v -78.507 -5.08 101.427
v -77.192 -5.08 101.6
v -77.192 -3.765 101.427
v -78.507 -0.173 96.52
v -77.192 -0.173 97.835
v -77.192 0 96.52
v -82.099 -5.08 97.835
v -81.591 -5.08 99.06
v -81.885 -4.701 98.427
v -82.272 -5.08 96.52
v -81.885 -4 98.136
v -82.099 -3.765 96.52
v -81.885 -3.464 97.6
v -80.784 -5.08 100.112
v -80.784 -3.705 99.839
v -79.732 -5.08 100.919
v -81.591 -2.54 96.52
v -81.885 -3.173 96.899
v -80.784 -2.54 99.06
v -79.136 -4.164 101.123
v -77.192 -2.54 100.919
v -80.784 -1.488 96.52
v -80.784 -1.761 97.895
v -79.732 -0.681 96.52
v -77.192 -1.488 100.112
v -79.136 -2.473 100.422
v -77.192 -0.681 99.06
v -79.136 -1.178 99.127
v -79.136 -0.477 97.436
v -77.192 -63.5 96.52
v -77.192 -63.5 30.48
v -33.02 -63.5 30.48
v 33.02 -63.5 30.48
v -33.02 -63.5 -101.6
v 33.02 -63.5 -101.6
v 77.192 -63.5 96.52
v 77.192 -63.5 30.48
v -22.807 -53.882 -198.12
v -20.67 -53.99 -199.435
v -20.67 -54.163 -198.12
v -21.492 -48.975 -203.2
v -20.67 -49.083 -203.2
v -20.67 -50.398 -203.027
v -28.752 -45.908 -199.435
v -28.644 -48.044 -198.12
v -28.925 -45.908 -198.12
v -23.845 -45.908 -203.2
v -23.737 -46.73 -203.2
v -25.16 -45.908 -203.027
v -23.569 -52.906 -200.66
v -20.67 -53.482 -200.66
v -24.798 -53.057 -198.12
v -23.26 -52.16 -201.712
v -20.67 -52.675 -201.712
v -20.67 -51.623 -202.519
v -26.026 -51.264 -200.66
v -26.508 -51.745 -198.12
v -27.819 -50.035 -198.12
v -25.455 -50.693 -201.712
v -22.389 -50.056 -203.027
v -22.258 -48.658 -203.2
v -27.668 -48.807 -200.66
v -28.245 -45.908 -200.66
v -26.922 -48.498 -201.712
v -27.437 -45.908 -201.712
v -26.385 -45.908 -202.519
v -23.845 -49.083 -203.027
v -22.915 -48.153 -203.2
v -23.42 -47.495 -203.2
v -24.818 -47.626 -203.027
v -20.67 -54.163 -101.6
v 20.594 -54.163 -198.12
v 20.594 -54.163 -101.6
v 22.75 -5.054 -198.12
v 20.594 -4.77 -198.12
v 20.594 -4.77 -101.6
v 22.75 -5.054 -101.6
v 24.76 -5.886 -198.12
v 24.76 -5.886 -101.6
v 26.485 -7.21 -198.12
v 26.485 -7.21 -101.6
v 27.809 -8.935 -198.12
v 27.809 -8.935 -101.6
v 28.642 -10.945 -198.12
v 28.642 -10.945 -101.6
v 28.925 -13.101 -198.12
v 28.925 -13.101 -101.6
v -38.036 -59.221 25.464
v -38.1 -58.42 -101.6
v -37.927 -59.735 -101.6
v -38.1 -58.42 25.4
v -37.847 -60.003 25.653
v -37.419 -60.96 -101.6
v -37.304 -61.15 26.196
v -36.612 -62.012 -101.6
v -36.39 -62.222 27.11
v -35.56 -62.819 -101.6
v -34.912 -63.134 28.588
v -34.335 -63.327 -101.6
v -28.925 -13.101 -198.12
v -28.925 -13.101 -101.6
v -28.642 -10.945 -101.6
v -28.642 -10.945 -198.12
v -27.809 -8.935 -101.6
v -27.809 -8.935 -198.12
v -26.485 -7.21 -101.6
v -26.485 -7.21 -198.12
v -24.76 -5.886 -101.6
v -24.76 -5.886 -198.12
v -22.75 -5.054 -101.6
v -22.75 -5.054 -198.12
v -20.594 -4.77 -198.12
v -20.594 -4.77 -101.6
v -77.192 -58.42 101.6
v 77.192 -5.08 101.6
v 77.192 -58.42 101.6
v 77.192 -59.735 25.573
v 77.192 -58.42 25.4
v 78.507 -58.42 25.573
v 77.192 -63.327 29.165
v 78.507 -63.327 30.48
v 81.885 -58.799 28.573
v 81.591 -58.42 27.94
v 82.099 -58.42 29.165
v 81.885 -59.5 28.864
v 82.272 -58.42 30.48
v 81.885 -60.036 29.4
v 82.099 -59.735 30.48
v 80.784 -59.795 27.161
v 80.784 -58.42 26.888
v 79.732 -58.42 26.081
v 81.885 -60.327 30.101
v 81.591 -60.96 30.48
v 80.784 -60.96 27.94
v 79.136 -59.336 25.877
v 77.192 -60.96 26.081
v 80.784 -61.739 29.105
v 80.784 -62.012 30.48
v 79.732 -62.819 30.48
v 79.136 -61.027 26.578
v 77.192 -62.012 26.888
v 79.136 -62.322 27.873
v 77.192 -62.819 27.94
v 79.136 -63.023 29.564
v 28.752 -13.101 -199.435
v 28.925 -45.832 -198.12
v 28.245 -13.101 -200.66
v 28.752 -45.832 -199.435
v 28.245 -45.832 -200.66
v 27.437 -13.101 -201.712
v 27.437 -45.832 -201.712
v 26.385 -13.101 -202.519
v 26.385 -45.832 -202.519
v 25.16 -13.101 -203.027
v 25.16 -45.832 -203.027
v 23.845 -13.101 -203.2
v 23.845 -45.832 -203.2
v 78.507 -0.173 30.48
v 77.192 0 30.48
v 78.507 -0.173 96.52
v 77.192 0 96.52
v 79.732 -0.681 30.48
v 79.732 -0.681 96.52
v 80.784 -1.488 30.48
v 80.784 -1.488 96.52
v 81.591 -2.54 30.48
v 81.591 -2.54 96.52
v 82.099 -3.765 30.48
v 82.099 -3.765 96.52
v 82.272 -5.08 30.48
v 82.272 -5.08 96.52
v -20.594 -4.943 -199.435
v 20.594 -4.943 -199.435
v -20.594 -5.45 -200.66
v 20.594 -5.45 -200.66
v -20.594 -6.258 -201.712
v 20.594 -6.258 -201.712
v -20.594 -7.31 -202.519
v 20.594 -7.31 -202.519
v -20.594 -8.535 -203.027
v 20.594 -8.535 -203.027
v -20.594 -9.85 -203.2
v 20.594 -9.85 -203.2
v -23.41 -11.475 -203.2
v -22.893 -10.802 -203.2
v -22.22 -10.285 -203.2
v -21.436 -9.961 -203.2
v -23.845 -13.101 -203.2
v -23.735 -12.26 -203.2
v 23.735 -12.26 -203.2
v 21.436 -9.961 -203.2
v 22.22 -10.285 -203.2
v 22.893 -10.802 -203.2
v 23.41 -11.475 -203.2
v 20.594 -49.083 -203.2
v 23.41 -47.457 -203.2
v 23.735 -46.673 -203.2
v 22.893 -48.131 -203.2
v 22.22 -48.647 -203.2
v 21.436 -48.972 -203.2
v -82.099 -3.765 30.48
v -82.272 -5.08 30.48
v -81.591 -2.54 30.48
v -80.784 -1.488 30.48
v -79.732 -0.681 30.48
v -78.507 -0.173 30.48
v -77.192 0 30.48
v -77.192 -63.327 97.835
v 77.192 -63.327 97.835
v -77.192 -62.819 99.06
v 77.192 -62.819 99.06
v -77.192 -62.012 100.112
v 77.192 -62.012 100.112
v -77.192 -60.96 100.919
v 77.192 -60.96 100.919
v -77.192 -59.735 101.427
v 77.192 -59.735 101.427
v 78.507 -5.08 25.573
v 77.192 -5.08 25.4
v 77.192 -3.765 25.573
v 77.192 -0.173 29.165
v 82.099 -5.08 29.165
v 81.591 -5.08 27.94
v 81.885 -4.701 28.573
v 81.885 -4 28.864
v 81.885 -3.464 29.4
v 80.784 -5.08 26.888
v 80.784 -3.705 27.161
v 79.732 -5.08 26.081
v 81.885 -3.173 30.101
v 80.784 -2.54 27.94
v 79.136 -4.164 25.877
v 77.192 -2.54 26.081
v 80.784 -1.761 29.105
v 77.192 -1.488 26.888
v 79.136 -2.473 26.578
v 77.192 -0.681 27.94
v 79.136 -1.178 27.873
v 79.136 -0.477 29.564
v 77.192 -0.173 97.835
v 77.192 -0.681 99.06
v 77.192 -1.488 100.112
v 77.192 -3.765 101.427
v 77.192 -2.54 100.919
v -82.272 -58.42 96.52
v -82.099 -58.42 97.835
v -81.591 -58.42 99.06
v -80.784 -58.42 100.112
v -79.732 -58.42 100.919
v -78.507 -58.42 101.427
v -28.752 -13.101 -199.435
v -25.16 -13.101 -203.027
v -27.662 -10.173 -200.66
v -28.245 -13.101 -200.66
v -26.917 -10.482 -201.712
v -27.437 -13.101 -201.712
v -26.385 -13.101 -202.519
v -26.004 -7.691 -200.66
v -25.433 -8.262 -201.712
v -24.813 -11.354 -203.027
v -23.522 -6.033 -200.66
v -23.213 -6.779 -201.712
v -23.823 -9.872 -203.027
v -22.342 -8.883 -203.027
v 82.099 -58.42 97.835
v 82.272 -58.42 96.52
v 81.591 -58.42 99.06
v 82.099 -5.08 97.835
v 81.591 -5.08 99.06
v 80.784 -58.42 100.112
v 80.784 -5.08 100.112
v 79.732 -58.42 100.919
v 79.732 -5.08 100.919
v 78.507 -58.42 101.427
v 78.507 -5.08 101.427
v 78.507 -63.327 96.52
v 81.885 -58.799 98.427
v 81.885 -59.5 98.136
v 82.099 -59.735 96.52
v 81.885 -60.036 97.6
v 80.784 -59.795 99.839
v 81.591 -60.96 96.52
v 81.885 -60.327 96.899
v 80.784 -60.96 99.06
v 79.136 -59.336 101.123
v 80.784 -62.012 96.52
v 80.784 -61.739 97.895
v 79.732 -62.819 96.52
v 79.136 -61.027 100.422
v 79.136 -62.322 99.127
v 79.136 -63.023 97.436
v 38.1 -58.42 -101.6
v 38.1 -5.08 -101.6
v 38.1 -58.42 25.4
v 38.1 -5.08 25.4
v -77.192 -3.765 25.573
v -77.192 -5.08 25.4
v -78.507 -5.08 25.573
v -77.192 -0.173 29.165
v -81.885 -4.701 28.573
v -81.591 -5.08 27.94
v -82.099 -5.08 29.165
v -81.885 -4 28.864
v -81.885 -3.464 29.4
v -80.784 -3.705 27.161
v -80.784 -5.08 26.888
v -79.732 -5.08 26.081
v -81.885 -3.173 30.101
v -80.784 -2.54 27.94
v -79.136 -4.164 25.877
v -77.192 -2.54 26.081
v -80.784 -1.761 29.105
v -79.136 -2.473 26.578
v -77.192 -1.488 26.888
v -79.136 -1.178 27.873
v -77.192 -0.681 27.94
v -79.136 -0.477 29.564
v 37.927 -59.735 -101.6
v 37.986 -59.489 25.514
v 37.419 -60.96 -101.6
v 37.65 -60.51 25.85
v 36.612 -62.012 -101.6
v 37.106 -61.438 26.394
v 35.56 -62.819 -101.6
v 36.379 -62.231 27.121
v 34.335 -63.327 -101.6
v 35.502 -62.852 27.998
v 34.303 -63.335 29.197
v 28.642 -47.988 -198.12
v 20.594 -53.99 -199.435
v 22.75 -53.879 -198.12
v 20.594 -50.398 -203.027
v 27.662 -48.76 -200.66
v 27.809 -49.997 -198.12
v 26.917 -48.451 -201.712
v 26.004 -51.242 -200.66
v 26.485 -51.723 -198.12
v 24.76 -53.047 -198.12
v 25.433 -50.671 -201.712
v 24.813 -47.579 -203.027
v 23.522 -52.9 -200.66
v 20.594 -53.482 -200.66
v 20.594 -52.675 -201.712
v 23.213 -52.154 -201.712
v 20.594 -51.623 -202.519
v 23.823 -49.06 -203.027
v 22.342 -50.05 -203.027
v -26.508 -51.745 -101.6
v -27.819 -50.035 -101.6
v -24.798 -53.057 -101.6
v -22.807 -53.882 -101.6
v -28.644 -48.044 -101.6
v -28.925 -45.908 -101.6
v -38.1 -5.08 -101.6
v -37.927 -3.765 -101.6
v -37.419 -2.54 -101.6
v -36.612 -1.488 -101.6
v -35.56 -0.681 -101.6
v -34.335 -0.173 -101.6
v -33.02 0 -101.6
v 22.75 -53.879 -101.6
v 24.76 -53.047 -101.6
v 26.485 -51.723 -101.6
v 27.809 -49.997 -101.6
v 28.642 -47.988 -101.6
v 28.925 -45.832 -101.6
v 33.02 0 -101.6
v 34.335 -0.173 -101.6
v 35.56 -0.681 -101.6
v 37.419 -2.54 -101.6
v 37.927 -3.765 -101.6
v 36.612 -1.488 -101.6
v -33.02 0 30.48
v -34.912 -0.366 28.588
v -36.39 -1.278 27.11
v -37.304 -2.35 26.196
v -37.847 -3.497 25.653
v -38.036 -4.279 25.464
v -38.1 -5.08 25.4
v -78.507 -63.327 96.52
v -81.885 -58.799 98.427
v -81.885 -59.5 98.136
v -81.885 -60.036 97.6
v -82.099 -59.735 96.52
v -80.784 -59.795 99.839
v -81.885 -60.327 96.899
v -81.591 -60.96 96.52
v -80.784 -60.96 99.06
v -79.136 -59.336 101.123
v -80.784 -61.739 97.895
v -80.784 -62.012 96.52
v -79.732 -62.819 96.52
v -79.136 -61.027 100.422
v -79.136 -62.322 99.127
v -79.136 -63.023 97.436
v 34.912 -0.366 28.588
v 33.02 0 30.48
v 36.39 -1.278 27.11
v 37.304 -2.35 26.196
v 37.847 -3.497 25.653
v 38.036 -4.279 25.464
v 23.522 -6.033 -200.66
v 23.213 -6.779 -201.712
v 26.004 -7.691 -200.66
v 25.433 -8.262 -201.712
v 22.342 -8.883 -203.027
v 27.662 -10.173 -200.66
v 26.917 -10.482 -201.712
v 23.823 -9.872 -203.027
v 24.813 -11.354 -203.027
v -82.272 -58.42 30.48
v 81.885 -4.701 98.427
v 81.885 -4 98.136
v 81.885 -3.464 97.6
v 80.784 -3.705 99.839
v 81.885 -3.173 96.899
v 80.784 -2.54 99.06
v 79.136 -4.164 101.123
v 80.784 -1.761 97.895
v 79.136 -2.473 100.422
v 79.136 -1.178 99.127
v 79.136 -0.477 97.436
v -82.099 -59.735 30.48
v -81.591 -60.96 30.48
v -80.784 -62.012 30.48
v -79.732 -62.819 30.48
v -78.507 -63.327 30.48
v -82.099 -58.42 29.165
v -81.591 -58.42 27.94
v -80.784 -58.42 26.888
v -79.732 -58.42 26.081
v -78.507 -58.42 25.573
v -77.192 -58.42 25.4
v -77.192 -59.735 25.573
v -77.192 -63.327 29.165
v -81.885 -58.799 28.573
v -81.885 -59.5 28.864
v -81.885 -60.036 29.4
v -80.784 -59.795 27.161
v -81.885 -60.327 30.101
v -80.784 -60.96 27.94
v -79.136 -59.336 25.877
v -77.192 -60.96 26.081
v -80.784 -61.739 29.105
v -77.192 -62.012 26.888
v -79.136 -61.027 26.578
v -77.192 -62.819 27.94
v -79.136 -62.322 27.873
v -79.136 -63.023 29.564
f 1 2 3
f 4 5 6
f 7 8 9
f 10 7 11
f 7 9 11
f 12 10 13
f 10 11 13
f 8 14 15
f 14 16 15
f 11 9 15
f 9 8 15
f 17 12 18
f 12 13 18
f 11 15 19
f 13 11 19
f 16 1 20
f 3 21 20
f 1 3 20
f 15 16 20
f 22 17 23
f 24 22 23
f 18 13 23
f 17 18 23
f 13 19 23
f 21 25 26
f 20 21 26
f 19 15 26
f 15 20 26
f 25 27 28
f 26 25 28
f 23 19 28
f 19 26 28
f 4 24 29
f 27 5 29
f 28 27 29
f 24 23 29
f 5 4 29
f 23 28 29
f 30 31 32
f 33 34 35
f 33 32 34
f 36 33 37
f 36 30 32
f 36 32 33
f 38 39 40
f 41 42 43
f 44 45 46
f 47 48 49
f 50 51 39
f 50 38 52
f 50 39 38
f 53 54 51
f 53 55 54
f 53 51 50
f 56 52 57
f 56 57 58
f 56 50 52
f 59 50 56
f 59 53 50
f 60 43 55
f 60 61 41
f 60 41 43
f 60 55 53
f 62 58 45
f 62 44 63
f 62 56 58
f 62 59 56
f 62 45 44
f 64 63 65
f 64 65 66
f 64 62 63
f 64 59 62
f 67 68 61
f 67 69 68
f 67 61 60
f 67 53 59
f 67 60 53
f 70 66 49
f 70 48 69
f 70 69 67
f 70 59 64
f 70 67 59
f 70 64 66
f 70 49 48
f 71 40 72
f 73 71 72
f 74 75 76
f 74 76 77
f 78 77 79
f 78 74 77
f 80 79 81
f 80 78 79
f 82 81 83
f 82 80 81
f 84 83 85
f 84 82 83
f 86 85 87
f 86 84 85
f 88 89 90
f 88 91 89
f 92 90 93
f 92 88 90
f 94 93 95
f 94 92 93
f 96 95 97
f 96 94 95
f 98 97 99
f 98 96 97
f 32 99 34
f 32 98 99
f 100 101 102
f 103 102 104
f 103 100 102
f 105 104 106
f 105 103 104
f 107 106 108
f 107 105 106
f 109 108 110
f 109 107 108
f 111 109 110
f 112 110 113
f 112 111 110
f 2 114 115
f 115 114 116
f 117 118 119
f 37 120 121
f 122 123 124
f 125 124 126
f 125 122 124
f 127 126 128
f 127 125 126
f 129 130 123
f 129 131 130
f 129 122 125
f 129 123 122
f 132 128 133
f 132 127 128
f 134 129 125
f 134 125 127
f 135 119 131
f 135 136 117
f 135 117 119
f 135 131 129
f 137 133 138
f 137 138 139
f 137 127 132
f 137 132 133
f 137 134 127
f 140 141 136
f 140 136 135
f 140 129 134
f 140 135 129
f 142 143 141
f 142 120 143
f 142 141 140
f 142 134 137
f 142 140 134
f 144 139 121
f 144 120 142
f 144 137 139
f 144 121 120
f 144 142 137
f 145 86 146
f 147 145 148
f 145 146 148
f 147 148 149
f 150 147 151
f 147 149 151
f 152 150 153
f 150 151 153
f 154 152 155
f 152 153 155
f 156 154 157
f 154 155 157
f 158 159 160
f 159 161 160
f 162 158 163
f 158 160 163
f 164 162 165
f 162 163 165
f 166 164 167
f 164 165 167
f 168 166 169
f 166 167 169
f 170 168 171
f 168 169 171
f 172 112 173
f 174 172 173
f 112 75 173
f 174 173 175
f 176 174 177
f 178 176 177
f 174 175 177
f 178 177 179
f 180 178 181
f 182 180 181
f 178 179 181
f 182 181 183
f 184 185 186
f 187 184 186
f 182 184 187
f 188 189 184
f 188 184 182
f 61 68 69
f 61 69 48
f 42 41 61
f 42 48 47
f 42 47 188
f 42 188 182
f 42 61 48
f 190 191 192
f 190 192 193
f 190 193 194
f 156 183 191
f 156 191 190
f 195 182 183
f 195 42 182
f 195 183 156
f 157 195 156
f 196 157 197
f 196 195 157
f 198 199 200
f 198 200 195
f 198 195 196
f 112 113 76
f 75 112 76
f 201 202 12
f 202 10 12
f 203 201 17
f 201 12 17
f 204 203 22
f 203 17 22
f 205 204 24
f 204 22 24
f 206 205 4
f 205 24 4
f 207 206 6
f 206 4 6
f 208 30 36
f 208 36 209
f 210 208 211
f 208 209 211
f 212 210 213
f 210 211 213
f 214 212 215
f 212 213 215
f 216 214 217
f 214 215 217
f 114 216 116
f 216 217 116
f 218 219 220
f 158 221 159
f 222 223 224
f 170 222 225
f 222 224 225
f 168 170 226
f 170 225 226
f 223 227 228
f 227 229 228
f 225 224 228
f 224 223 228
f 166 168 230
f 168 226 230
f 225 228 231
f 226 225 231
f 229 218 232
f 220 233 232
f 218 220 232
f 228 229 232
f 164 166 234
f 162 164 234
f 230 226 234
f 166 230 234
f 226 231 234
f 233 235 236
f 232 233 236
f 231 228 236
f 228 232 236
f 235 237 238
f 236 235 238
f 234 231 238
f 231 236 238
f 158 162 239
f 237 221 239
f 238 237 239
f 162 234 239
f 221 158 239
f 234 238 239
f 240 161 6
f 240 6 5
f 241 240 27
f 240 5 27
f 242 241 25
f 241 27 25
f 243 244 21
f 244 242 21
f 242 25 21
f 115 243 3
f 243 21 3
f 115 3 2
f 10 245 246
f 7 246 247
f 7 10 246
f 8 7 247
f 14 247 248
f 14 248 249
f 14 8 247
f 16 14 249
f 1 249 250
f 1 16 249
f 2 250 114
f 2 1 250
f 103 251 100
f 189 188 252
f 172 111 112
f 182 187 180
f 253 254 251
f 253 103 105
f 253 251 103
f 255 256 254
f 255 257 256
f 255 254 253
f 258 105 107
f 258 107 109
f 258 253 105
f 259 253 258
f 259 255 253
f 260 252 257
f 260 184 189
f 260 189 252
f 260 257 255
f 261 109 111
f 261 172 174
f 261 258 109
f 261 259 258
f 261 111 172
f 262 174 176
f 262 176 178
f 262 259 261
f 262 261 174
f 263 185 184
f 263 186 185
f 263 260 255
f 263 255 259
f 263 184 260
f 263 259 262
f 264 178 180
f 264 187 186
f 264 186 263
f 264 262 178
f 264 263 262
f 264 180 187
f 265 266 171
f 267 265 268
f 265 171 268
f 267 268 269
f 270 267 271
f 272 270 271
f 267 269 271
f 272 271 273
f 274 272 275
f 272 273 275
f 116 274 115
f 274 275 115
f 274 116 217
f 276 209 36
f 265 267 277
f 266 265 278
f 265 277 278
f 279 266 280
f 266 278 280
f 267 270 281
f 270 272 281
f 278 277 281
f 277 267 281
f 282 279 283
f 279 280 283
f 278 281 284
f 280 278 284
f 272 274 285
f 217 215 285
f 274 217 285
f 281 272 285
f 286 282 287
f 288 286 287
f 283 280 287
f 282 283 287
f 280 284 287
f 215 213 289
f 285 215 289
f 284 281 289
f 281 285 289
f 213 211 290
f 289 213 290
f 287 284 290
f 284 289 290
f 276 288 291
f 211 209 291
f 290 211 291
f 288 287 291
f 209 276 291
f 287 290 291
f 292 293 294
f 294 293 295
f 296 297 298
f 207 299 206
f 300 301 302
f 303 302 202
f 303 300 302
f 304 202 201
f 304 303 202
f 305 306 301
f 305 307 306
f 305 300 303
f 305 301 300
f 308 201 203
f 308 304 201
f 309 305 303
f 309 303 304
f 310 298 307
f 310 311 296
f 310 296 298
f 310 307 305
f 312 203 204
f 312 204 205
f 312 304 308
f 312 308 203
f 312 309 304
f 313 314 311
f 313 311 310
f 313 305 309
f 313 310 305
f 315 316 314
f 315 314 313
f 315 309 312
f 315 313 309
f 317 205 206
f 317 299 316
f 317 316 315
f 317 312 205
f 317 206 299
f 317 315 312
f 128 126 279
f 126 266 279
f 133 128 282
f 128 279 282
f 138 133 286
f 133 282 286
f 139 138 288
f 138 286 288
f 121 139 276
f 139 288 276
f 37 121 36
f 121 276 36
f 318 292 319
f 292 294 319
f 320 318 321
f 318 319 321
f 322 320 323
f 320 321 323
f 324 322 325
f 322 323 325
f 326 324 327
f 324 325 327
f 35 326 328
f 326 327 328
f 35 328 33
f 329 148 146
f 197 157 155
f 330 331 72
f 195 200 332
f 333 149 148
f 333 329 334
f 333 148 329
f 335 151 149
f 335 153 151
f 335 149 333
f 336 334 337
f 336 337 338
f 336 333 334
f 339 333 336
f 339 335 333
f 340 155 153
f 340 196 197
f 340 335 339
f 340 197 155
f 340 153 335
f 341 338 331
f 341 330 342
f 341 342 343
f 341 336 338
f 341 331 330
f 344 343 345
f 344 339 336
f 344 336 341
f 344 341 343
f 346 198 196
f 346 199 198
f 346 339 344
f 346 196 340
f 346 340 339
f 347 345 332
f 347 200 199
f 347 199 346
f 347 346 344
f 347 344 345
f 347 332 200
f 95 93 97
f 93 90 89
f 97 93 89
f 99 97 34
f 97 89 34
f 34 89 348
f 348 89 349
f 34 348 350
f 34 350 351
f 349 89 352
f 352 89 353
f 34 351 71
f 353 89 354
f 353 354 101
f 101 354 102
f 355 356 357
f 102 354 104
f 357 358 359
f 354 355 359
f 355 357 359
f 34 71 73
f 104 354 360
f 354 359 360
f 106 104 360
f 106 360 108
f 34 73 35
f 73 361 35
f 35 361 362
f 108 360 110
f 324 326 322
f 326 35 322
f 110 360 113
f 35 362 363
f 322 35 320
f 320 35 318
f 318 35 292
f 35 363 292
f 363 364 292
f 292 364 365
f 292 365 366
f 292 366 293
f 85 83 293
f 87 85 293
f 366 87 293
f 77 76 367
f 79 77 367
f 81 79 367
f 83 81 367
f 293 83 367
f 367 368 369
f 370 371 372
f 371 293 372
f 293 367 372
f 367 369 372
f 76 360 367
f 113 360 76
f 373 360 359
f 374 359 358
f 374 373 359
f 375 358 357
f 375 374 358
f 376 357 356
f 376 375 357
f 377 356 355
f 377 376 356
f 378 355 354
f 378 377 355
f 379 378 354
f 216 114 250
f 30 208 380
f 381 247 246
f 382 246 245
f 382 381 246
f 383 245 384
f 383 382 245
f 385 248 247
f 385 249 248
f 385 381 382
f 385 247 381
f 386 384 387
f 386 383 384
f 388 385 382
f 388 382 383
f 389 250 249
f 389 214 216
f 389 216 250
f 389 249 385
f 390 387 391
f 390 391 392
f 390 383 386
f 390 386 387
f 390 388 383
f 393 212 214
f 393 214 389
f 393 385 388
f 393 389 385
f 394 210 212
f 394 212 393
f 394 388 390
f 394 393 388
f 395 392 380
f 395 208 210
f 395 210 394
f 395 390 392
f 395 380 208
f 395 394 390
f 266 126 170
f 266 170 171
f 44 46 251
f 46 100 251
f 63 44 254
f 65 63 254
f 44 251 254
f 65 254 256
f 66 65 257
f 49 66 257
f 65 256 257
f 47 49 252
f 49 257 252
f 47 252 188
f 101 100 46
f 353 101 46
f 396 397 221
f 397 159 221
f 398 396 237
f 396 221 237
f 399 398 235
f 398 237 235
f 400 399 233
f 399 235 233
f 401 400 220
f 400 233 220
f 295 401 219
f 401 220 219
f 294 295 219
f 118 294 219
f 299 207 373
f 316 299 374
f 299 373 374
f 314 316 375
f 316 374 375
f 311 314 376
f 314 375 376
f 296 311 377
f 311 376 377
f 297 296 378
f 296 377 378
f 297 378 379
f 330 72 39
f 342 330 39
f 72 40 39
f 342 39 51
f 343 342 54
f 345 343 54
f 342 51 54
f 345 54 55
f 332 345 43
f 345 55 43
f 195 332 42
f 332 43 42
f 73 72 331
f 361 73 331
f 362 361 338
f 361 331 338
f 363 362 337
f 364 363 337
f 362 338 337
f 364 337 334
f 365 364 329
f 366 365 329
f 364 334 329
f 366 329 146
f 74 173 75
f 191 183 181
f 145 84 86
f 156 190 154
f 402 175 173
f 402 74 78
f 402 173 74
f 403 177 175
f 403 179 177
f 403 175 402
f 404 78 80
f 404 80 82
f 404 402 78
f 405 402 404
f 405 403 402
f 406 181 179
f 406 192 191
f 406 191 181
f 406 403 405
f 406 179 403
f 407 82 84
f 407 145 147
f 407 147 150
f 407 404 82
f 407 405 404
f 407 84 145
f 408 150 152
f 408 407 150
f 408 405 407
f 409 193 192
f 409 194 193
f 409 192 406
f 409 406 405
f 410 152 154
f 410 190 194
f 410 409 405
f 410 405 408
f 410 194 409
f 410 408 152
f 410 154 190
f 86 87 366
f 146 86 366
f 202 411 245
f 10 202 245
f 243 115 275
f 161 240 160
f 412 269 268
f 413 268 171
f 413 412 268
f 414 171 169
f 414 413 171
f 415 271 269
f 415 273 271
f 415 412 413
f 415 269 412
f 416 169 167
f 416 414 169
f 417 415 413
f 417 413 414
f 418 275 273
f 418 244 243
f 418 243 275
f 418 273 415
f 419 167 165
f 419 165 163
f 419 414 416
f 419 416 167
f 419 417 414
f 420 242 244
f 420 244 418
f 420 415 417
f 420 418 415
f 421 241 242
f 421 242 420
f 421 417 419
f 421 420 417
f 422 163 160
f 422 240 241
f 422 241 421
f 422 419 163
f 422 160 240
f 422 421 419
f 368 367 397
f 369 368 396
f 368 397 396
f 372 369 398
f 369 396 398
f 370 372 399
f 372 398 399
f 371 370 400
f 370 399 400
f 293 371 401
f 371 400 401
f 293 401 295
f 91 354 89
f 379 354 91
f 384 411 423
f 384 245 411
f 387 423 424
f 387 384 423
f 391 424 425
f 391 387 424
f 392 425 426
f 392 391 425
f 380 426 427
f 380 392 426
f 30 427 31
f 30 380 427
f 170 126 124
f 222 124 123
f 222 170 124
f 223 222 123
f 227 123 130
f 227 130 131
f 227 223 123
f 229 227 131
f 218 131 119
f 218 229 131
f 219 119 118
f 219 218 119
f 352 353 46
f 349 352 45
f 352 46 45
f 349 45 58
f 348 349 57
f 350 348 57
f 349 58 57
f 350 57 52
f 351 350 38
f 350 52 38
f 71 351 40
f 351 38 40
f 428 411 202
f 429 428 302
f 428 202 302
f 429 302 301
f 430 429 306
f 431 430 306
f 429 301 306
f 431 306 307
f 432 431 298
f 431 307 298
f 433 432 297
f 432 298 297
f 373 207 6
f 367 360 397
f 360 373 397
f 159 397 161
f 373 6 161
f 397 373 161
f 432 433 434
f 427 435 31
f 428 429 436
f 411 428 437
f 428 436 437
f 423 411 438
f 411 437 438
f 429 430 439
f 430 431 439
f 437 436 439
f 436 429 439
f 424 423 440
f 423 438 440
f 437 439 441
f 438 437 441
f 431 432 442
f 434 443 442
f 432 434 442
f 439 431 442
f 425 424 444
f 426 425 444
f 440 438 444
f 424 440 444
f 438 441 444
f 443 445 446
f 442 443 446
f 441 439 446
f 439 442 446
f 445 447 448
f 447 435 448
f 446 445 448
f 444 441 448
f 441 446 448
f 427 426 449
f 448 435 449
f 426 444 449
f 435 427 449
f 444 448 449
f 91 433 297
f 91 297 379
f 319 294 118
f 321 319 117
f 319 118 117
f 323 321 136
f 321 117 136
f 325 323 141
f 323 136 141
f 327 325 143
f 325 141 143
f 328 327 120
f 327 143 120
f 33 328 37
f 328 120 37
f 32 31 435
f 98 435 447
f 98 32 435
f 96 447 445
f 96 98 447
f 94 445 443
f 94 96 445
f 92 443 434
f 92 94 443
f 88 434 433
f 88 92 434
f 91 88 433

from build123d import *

# Parameters (mm, degrees)
F0_W     = 76.2
F0_H     = 203.2
F1_DEPTH = 63.5
F2_W     = 57.8507818282
F2_H     = 49.3930634111
F3_DEPTH = 101.6
F4_R     = 8.255
F5_R     = 8.3312
F6_R     = 5.08
F7_W     = 164.5440448
F7_H     = 76.2
F8_DEPTH = 63.5
F9_R     = 5.08


with BuildPart() as f1:
    # F0 (on Front) → F1 (new body)
    with BuildSketch(Plane.XZ):
        Rectangle(F0_W, F0_H)
    extrude(amount=F1_DEPTH)

    # F2 (on face) → F3 (join)
    with BuildSketch(Plane(origin=(0, 0, -101.6), x_dir=(1, 0, 0), z_dir=(0, 0, -1))):
        with Locations((0, 29.4664166868)):
            Rectangle(F2_W, F2_H)
    extrude(amount=F3_DEPTH)

    # F4
    f4_edges = [f1.edges().sort_by_distance(p)[0] for p in [
        (-28.925391, -54.162948, -152.4),
    ]]
    fillet(f4_edges, radius=F4_R)

    # F5
    f5_edges = [f1.edges().sort_by_distance(p)[0] for p in [
        (28.925391, -54.162948, -152.4),
        (28.925391, -4.769885, -152.4),
        (-28.925391, -4.769885, -152.4),
    ]]
    fillet(f5_edges, radius=F5_R)

    # F6
    f6_edges = [f1.edges().sort_by_distance(p)[0] for p in [
        (28.925391, -29.466417, -203.2),
        (26.485239, -51.722796, -203.2),
        (26.485239, -7.210037, -203.2),
        (0, -4.769885, -203.2),
        (-0.0381, -54.162948, -203.2),
        (-26.507557, -51.745115, -203.2),
        (-28.925391, -29.504517, -203.2),
        (-26.485239, -7.210037, -203.2),
    ]]
    fillet(f6_edges, radius=F6_R)

    # F7 (on face) → F8 (join)
    with BuildSketch(Plane.XZ.offset(63.5)):
        with Locations((0, 63.5)):
            Rectangle(F7_W, F7_H)
    extrude(amount=-F8_DEPTH)

    # F9
    f9_edges = [f1.edges().sort_by_distance(p)[0] for p in [
        (0, -63.5, 101.6),
        (0, 0, 101.6),
        (-60.186011, 0, 25.4),
        (60.186011, 0, 25.4),
        (-60.186011, -63.5, 25.4),
        (60.186011, -63.5, 25.4),
        (82.272022, -31.75, 25.4),
        (82.272022, -31.75, 101.6),
        (82.272022, -63.5, 63.5),
        (82.272022, 0, 63.5),
        (-82.272022, -31.75, 101.6),
        (-82.272022, -31.75, 25.4),
        (-82.272022, -63.5, 63.5),
        (-82.272022, 0, 63.5),
        (-38.1, -63.5, -38.1),
        (38.1, -63.5, -38.1),
        (-38.1, 0, -38.1),
        (38.1, 0, -38.1),
    ]]
    fillet(f9_edges, radius=F9_R)


solid = f1.part
